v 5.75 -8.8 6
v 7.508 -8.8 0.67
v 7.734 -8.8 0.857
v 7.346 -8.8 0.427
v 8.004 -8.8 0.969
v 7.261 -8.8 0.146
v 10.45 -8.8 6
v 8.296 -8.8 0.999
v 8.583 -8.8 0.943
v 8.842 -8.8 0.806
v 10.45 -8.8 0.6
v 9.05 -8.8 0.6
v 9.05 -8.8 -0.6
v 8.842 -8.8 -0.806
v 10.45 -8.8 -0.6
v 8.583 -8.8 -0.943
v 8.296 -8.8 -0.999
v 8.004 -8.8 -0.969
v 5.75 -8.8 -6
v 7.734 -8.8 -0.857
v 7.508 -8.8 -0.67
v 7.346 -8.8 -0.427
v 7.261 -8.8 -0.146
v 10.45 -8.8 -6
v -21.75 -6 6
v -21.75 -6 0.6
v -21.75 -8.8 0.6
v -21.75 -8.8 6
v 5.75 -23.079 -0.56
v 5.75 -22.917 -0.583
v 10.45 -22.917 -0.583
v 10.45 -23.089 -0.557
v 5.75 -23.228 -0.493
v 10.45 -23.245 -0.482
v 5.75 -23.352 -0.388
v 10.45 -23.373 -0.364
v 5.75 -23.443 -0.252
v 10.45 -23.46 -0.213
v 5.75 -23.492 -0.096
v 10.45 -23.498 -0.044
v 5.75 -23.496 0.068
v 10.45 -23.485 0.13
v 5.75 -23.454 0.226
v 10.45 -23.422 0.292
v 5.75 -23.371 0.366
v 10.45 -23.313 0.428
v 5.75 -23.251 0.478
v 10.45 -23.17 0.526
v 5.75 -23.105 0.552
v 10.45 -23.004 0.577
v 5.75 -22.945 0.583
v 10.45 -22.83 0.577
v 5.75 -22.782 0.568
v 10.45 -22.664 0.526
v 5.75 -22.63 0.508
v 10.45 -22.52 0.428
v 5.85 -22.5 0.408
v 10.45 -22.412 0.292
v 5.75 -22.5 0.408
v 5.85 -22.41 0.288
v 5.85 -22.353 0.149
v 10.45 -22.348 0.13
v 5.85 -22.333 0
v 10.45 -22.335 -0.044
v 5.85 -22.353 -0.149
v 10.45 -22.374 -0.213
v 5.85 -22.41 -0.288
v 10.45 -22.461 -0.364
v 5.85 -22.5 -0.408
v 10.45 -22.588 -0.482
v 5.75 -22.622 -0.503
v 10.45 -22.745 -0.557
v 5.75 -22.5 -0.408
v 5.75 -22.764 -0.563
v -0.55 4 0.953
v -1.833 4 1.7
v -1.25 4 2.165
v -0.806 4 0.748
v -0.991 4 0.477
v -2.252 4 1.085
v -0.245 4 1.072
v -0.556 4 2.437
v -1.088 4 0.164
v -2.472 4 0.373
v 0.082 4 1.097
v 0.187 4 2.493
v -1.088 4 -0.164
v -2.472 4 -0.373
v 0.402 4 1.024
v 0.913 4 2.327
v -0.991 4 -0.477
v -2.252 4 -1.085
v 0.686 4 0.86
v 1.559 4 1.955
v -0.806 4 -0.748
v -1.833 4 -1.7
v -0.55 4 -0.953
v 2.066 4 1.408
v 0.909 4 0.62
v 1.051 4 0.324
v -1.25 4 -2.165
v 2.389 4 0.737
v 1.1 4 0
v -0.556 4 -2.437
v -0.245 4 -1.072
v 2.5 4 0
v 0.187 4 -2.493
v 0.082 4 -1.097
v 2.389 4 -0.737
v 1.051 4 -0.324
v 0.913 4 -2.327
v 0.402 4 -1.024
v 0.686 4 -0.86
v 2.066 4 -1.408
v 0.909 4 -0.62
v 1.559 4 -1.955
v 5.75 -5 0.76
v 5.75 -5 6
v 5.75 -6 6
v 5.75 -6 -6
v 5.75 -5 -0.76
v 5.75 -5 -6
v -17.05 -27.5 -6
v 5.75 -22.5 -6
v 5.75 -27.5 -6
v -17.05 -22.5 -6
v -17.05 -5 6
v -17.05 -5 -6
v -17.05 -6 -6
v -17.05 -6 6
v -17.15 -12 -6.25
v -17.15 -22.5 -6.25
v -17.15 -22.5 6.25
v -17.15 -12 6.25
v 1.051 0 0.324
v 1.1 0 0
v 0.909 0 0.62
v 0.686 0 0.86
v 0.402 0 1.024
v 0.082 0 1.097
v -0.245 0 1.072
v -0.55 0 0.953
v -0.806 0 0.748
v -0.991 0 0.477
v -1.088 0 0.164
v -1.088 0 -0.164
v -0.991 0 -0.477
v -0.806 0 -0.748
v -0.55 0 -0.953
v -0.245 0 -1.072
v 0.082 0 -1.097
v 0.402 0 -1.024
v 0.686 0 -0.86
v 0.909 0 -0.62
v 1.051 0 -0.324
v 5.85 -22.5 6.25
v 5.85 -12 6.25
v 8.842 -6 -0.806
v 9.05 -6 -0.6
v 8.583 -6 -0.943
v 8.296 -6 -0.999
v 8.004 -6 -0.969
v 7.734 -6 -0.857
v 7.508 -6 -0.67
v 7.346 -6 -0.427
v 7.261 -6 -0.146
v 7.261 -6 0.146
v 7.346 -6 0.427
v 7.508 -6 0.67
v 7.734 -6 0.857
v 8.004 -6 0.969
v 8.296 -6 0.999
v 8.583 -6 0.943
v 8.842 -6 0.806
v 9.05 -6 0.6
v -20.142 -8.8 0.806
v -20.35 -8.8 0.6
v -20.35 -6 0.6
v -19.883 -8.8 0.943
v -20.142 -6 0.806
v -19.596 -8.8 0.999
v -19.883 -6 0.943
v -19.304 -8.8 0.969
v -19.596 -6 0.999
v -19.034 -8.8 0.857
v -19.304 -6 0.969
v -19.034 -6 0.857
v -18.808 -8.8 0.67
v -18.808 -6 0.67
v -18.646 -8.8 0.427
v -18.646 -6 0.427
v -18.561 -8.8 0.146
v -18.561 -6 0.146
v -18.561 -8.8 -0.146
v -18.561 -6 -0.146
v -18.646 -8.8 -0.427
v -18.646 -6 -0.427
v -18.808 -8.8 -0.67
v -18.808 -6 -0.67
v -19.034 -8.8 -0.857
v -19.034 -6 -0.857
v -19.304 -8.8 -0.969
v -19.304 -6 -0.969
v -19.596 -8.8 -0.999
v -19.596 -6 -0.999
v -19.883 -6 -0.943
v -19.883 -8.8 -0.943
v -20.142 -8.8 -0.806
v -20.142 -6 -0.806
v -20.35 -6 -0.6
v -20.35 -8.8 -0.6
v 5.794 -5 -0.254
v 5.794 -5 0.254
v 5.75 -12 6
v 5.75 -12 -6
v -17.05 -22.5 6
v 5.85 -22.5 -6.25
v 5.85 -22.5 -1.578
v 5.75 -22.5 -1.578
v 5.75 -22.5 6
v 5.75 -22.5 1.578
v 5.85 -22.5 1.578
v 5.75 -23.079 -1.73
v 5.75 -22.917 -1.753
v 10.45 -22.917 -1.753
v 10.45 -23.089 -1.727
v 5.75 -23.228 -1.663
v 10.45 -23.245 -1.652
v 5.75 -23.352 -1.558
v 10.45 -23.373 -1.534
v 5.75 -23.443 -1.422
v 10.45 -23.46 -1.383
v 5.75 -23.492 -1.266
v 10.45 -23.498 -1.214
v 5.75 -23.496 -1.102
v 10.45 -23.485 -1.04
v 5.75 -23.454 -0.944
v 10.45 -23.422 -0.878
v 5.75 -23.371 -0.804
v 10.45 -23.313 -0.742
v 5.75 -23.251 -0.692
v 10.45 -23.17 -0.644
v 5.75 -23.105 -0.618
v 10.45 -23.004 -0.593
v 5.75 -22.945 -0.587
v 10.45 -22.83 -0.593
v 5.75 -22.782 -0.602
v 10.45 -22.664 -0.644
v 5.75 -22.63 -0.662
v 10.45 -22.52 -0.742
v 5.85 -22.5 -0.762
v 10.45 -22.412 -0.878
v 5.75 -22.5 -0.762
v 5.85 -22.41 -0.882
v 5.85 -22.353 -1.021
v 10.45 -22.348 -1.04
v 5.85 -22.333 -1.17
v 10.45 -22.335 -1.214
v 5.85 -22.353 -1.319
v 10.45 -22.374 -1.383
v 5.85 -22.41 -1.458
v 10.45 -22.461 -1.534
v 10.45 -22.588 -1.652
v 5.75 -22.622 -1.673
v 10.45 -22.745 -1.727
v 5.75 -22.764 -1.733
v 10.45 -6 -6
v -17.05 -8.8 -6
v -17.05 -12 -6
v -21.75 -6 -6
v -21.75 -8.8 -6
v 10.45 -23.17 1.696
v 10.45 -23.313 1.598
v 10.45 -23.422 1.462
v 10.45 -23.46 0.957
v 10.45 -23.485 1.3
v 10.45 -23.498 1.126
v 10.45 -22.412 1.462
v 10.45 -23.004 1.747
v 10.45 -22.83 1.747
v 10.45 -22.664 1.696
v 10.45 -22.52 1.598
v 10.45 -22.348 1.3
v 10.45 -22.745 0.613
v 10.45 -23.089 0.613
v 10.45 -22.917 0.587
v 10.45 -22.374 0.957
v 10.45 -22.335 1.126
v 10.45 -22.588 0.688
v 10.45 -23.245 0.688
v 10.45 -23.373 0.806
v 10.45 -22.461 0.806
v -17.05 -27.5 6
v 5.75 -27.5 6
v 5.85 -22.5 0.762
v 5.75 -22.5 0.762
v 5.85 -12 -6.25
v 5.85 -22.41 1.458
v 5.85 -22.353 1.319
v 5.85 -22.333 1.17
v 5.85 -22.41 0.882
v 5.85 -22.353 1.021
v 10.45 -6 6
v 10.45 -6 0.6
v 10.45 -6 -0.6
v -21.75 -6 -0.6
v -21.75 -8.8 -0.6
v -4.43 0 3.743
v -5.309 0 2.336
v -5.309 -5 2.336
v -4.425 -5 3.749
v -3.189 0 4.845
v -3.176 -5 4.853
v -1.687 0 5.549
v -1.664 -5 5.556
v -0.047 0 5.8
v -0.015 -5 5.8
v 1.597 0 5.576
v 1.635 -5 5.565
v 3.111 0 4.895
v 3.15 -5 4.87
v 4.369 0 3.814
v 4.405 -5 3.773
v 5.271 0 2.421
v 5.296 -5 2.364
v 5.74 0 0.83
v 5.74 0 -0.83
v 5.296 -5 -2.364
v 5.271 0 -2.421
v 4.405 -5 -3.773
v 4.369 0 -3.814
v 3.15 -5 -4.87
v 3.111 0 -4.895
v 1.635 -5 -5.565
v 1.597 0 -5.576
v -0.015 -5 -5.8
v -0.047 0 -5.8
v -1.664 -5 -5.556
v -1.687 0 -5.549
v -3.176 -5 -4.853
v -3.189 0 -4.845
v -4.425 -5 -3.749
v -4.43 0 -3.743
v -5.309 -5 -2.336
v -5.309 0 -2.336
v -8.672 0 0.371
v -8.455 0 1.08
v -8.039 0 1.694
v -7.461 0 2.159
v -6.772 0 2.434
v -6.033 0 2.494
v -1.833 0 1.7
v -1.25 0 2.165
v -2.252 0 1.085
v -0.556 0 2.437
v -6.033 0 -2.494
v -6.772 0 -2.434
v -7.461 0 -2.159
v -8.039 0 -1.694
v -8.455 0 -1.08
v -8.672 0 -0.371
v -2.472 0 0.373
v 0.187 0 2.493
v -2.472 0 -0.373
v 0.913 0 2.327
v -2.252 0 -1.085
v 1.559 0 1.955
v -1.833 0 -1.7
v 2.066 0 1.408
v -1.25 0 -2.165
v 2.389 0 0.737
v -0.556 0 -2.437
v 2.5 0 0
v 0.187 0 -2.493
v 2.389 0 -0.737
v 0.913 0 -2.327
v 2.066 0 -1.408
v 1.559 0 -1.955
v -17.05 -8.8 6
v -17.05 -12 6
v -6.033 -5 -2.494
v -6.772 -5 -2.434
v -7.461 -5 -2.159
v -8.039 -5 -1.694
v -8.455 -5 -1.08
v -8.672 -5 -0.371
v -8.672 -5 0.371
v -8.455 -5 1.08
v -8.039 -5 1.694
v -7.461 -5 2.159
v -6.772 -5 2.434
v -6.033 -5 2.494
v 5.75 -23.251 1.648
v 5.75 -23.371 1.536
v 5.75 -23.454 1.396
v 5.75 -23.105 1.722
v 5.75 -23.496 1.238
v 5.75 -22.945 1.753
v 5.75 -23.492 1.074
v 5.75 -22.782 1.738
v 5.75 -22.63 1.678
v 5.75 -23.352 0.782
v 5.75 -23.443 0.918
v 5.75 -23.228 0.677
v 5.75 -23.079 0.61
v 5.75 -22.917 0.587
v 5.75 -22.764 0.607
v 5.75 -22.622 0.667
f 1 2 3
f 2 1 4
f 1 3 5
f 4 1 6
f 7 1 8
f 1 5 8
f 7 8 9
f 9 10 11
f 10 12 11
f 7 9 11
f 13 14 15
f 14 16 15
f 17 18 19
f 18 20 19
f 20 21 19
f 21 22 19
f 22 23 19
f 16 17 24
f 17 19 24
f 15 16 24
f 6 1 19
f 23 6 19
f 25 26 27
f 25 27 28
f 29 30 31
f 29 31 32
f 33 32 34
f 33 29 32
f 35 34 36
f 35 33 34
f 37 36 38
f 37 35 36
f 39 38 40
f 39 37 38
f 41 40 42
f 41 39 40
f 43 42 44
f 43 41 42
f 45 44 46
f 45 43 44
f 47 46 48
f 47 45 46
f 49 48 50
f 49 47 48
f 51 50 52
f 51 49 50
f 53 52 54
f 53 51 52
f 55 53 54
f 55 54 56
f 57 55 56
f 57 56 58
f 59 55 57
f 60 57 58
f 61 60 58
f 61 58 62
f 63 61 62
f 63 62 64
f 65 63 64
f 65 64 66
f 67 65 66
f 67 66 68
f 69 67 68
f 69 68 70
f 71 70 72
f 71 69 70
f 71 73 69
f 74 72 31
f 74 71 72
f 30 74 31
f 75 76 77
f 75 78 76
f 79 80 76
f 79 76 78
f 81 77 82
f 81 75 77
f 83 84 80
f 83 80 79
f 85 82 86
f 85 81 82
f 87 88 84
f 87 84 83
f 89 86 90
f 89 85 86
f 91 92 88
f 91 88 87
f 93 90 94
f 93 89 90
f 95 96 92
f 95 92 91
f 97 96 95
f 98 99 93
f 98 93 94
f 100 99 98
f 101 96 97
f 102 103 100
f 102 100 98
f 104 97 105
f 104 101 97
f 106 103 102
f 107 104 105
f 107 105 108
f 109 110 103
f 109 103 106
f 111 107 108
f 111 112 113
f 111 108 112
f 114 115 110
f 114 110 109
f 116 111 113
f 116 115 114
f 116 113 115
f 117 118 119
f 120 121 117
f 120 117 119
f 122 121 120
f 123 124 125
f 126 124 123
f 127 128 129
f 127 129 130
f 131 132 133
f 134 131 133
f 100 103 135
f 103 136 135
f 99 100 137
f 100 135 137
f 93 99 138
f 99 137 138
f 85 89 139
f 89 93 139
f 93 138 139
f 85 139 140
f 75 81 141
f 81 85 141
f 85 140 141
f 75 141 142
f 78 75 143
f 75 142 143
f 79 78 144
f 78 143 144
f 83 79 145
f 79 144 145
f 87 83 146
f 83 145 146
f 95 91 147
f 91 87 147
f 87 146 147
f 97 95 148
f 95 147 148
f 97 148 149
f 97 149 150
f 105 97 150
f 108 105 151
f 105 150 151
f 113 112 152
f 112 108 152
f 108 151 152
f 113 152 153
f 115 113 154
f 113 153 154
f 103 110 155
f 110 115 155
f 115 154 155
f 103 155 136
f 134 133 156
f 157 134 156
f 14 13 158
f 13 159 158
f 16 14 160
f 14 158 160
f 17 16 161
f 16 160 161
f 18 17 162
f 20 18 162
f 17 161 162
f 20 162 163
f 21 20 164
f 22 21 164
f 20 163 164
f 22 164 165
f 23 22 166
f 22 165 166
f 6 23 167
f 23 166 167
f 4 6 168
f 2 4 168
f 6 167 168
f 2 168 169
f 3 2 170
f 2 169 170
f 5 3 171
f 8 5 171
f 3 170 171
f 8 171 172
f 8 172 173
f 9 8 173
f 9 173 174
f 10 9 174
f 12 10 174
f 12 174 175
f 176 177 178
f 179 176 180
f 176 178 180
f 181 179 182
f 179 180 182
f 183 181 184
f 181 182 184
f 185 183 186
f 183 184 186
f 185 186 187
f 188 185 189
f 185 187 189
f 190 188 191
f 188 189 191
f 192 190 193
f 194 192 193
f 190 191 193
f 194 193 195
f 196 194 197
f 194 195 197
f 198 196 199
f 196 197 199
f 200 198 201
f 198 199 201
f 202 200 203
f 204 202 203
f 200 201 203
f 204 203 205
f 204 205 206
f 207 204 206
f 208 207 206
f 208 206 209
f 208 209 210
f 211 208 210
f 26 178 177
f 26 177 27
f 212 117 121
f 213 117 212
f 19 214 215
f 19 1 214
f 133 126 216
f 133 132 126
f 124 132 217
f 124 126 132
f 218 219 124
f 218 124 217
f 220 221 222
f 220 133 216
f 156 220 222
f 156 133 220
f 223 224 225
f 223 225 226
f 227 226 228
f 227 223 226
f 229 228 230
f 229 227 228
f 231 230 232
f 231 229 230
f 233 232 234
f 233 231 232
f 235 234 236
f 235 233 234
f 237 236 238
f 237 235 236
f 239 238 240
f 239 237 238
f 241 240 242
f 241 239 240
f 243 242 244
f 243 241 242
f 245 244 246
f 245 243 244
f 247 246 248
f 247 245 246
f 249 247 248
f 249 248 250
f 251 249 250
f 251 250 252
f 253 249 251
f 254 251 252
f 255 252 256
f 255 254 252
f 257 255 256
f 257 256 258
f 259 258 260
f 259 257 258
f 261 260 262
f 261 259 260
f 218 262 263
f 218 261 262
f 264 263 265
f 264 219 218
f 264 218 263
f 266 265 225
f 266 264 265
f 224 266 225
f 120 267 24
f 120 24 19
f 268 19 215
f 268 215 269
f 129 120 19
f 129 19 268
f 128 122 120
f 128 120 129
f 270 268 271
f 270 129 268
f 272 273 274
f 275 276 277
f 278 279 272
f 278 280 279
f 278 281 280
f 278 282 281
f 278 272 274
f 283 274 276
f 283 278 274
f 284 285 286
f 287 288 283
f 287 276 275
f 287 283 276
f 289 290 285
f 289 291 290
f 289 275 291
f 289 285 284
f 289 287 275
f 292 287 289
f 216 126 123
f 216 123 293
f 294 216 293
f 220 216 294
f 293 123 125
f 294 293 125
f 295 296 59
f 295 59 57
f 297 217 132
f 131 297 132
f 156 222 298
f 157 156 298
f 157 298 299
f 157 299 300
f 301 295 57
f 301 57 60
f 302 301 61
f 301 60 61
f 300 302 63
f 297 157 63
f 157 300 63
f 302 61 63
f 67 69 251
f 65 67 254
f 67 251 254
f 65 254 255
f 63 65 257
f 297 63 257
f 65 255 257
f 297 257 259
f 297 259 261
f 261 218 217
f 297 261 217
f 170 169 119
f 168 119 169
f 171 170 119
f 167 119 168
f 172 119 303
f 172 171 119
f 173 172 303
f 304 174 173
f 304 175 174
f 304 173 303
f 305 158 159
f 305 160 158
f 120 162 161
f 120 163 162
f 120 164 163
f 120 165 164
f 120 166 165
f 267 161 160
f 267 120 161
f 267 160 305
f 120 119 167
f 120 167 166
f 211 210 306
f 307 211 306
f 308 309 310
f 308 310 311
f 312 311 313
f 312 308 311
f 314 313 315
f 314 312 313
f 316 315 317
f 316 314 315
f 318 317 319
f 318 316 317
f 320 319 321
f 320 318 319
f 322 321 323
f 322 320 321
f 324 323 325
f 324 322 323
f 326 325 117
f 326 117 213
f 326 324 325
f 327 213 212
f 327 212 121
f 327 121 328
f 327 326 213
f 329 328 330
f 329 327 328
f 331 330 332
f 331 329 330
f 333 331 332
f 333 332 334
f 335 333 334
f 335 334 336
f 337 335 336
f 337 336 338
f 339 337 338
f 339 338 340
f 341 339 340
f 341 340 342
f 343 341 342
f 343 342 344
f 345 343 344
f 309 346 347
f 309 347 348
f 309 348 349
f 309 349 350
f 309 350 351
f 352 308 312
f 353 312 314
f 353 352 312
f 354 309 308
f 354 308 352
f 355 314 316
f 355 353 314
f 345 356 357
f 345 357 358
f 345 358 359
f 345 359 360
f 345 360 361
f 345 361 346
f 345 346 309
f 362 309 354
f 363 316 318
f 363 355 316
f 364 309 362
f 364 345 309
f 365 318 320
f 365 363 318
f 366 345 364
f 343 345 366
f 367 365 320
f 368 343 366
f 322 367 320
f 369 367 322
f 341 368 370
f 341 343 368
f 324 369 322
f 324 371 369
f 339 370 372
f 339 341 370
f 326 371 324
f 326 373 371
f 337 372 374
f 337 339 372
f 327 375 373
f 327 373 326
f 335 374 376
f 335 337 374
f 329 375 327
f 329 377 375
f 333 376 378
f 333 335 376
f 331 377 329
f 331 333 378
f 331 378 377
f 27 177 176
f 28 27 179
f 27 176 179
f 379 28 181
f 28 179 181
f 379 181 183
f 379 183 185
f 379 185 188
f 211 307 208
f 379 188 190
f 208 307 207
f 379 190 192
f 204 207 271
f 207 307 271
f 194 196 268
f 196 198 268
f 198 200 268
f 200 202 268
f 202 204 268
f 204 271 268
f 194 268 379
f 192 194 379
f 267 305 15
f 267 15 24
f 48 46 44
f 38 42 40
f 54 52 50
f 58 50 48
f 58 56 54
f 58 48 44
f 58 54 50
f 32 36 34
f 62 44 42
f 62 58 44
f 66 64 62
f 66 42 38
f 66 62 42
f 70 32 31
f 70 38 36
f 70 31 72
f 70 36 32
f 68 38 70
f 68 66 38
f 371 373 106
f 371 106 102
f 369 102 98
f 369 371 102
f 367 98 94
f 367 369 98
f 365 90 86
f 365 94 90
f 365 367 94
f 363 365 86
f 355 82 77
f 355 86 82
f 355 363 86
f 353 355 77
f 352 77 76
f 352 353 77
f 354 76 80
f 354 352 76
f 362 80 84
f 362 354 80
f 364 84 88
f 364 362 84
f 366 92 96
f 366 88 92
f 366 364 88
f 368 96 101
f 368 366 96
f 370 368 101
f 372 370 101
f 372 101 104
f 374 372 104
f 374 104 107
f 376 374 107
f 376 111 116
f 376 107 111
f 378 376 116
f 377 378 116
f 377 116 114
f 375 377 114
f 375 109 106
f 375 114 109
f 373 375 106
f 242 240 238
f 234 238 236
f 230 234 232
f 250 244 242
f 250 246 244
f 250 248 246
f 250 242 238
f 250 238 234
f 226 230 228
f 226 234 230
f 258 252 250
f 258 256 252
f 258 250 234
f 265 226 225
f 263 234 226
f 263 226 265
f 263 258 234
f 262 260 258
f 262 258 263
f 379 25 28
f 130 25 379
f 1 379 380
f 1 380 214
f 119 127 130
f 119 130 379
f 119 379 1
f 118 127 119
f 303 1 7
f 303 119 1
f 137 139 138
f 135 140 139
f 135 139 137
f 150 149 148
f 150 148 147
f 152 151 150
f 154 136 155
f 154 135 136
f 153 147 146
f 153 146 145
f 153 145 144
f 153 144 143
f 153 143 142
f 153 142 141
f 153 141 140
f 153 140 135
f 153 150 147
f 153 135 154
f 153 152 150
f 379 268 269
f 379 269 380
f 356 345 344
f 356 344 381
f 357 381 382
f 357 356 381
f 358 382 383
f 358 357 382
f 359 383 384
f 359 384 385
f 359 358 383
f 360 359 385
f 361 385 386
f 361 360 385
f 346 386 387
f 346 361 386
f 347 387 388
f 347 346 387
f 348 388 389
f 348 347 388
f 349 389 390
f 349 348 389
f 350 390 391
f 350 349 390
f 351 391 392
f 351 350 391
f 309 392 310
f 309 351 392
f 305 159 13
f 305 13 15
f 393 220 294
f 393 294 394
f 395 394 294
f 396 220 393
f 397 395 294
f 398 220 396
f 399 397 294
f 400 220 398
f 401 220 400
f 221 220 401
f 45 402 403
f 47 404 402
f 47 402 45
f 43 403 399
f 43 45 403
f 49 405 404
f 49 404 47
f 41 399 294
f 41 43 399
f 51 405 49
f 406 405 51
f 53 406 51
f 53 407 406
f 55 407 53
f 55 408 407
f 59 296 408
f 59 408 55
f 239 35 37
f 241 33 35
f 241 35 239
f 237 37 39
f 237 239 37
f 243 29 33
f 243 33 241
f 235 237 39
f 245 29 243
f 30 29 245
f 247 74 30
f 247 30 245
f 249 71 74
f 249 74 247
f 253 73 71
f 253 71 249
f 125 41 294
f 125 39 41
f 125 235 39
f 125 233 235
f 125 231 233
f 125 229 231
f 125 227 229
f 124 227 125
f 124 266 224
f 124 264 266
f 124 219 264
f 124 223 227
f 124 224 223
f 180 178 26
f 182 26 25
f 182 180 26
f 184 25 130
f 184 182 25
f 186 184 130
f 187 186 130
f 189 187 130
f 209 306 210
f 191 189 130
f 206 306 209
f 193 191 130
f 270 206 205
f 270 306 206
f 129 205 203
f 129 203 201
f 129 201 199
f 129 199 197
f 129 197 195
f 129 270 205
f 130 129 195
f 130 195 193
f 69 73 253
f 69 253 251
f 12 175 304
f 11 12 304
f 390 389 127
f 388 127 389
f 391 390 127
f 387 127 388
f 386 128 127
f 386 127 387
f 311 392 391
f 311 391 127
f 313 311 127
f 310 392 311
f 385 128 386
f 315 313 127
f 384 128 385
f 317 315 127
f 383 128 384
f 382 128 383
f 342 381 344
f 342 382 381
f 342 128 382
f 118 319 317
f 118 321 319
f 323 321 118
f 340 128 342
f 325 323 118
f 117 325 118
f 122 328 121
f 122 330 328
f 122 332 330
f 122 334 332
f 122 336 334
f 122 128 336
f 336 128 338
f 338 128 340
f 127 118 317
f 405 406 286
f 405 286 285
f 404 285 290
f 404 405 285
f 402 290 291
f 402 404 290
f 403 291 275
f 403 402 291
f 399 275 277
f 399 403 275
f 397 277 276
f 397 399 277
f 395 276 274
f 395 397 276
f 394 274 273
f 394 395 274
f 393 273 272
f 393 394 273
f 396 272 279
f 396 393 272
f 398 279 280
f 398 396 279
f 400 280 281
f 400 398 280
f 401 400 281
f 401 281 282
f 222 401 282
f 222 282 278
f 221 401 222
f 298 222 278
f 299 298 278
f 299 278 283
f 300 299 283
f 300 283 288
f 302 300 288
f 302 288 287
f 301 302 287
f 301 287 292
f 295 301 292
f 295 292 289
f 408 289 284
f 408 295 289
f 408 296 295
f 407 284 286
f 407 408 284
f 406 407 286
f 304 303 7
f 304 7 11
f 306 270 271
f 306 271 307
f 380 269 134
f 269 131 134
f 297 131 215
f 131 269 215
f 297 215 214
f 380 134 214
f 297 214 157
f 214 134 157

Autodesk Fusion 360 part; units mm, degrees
sketch "ServoRotatingPlate" plane through (0, 0, 0) normal (0, 1, 0) x (1, 0, 0)
  circle A0 centre (0, 0) radius 5.8
  line L0 (5.75, 6) -> (-17.05, 6)
  line L1 (-17.05, 6) -> (-17.05, -6)
  line L2 (-17.05, -6) -> (5.75, -6)
  line L3 (5.75, -6) -> (5.75, 6)
  line L4 (-8.7, 0) -> (5.75, 0) construction
  circle A1 centre (-6.2, 0) radius 2.5
  circle A2 centre (0, 0) radius 2.5
  circle A3 centre (0, 0) radius 1.1
  point P0 (5.8, 0)
  dimension "d4" = 11.6
  dimension "d6" = 12
  dimension "d7" = 22.8
  dimension "d10" = 5
  dimension "d12" = 14.5
  dimension "d13" = 5.75
  dimension "d14" = 8.1
  dimension "d48" = 5
  dimension "d49" = 1.4
extrude "Extrude1" add sketch "ServoRotatingPlate" against normal blind 5 contours A0 L3 | A0 L3 A1 | A0 A1 | A0 A1 | A2 | A3
extrude "Extrude2" add sketch "ServoRotatingPlate" against normal blind 22.5 from surface at -5 contours A0 L3 A1 | A0 L0 L1 L2 L3 A1 | A0 A1 | A0 A1 | A2 | A3
ref_plane "WorkPlane1" through (-5.65, -6, 0) normal (0, 1, 0) x (0, 0, 1)
sketch "EarBase" plane through (-5.65, -6, 0) normal (0, 1, 0) x (1, 0, 0)
  line L0 (16.1, 6) -> (-16.1, 6)
  line L1 (-16.1, 6) -> (-16.1, -6)
  line L2 (-16.1, -6) -> (16.1, -6)
  line L3 (16.1, -6) -> (16.1, 6)
  line L4 (16.1, 6) -> (-16.1, -6) construction
  line L5 (-16.1, 6) -> (16.1, -6) construction
  line L6 (-16.1, 0) -> (16.1, 0) construction
  circle A0 centre (-13.9, 0) radius 1
  line L7 (-14.7, 0.6) -> (-16.1, 0.6)
  line L8 (-14.7, -0.6) -> (-16.1, -0.6)
  line L9 (-11.4, 6) -> (-11.4, -6)
  line L10 (0, 0) -> (0, 6) construction
  line L11 (14.7, 0.6) -> (16.1, 0.6)
  circle A1 centre (13.9, 0) radius 1
  line L12 (14.7, -0.6) -> (16.1, -0.6)
  point P0 (11.4, 6)
  dimension "d26" = 32.2
  dimension "d31" = 2
  dimension "d33" = 1.2
  dimension "d34" = 2.5
  dimension "d35" = 4.7
extrude "Extrude3" add sketch "EarBase" against normal blind 2.8 contours L0 L2 L3 L9 L11 A1 L12 | L0 L1 L2 A0 L7 L8 L9
ref_plane "WorkPlane2" through (-5.65, -22.5, 0) normal (0, -1, 0) x (0, 0, -1)
sketch "StickerBase" plane through (-5.65, -22.5, 0) normal (0, -1, 0) x (1, 0, 0)
  line L0 (11.5, -6.25) -> (-11.5, -6.25)
  line L1 (-11.5, -6.25) -> (-11.5, 6.25)
  line L2 (-11.5, 6.25) -> (11.5, 6.25)
  line L3 (11.5, 6.25) -> (11.5, -6.25)
  line L4 (11.5, -6.25) -> (-11.5, 6.25) construction
  line L5 (-11.5, -6.25) -> (11.5, 6.25) construction
  dimension "d42" = 23
  dimension "d43" = 12.5
extrude "Extrude4" add sketch "StickerBase" against normal blind 10.5
extrude "Extrude5" add sketch "ServoRotatingPlate" along normal blind 4 contours A2
sketch "WireHardCoded" plane through (5.75, 0, 0) normal (1, 0, 0) x (0, 0, -1)
  line L0 (6, -22.5) -> (-6, -22.5)
  line L1 (-6, -22.5) -> (-6, -27.5)
  line L2 (-6, -27.5) -> (6, -27.5)
  line L3 (6, -27.5) -> (6, -22.5)
  line L4 (-1.75, -23.5) -> (1.75, -23.5) construction
  line L5 (1.75, -23.5) -> (1.75, -22.3333) construction
  line L6 (1.75, -22.3333) -> (-1.75, -22.3333) construction
  line L7 (-1.75, -22.3333) -> (-1.75, -23.5) construction
  line L8 (0, -27.5) -> (0, -23.5) construction
  line L9 (-1.75, -22.9167) -> (1.75, -22.9167) construction
  circle A0 centre (0, -22.9167) radius 0.5833
  circle A1 centre (-1.17, -22.9167) radius 0.5833
  circle A2 centre (1.17, -22.9167) radius 0.5833
  dimension "d52" = 1.1667
  dimension "d53" = 3.5
  dimension "d54" = 4
  dimension "d57" = 1.17
  dimension "d58" = 0
extrude "Extrude6" add sketch "WireHardCoded" along normal up to surface (4.7 mm away) contours L0 A2 | L0 A2 | L0 A0 | L0 A0 | L0 A1 | L0 A1
equation "Note0 = 0" comment "The [0,0,0] is placed at the servo shaft base plane, for better alignment"
equation "Note1 = 1" comment "Improvement for https://www.thingiverse.com/thing:2641076"
equation "BaseCircleD = 11.6 mm"
equation "d4 = BaseCircleD"
equation "BaseRectW = 12 mm"
equation "d6 = BaseRectW"
equation "d7 = BaseRectH"
equation "BaseRectH = 22.8 mm"
equation "BaseCircle2D = 5 mm"
equation "d10 = BaseCircle2D"
equation "E2EDist = 14.5 mm"
equation "d12 = E2EDist"
equation "d13 = CenterMeasureL"
equation "CenterMeasureL = 5.75 mm"
equation "GearIsleHeight = 5 mm"
equation "d17 = -GearIsleHeight"
equation "BoxHeight = 22.5 mm"
equation "d21 = -BoxHeight"
equation "Ear_Down = 1 mm"
equation "d24 = -Ear_Down"
equation "Ear_L = 32.2 mm"
equation "d26 = Ear_L"
equation "Ear_Thick = 2.8 mm"
equation "d28 = -Ear_Thick"
equation "EarScrew_D = 2 mm"
equation "d31 = EarScrew_D"
equation "Ear_Slit = 1.2 mm"
equation "d33 = Ear_Slit"
equation "d34 = HolePos"
equation "HolePos = 2.5 mm"
equation "sticker_height = 10.5 mm"
equation "stick_pos = 5 mm"
equation "d39 = -stick_pos"
equation "Sticker_Profile_L = 23 mm"
equation "Sticker_Profile_W = 12.5 mm"
equation "d42 = Sticker_Profile_L"
equation "d43 = Sticker_Profile_W"
equation "d44 = -sticker_height"
equation "ServoShaftProf = 5 mm"
equation "ServoProfHeight = 4 mm"
equation "d48 = ServoShaftProf"
equation "d50 = ServoProfHeight"
equation "d52 = ( 3.5 / 3 ) * 1 mm"
